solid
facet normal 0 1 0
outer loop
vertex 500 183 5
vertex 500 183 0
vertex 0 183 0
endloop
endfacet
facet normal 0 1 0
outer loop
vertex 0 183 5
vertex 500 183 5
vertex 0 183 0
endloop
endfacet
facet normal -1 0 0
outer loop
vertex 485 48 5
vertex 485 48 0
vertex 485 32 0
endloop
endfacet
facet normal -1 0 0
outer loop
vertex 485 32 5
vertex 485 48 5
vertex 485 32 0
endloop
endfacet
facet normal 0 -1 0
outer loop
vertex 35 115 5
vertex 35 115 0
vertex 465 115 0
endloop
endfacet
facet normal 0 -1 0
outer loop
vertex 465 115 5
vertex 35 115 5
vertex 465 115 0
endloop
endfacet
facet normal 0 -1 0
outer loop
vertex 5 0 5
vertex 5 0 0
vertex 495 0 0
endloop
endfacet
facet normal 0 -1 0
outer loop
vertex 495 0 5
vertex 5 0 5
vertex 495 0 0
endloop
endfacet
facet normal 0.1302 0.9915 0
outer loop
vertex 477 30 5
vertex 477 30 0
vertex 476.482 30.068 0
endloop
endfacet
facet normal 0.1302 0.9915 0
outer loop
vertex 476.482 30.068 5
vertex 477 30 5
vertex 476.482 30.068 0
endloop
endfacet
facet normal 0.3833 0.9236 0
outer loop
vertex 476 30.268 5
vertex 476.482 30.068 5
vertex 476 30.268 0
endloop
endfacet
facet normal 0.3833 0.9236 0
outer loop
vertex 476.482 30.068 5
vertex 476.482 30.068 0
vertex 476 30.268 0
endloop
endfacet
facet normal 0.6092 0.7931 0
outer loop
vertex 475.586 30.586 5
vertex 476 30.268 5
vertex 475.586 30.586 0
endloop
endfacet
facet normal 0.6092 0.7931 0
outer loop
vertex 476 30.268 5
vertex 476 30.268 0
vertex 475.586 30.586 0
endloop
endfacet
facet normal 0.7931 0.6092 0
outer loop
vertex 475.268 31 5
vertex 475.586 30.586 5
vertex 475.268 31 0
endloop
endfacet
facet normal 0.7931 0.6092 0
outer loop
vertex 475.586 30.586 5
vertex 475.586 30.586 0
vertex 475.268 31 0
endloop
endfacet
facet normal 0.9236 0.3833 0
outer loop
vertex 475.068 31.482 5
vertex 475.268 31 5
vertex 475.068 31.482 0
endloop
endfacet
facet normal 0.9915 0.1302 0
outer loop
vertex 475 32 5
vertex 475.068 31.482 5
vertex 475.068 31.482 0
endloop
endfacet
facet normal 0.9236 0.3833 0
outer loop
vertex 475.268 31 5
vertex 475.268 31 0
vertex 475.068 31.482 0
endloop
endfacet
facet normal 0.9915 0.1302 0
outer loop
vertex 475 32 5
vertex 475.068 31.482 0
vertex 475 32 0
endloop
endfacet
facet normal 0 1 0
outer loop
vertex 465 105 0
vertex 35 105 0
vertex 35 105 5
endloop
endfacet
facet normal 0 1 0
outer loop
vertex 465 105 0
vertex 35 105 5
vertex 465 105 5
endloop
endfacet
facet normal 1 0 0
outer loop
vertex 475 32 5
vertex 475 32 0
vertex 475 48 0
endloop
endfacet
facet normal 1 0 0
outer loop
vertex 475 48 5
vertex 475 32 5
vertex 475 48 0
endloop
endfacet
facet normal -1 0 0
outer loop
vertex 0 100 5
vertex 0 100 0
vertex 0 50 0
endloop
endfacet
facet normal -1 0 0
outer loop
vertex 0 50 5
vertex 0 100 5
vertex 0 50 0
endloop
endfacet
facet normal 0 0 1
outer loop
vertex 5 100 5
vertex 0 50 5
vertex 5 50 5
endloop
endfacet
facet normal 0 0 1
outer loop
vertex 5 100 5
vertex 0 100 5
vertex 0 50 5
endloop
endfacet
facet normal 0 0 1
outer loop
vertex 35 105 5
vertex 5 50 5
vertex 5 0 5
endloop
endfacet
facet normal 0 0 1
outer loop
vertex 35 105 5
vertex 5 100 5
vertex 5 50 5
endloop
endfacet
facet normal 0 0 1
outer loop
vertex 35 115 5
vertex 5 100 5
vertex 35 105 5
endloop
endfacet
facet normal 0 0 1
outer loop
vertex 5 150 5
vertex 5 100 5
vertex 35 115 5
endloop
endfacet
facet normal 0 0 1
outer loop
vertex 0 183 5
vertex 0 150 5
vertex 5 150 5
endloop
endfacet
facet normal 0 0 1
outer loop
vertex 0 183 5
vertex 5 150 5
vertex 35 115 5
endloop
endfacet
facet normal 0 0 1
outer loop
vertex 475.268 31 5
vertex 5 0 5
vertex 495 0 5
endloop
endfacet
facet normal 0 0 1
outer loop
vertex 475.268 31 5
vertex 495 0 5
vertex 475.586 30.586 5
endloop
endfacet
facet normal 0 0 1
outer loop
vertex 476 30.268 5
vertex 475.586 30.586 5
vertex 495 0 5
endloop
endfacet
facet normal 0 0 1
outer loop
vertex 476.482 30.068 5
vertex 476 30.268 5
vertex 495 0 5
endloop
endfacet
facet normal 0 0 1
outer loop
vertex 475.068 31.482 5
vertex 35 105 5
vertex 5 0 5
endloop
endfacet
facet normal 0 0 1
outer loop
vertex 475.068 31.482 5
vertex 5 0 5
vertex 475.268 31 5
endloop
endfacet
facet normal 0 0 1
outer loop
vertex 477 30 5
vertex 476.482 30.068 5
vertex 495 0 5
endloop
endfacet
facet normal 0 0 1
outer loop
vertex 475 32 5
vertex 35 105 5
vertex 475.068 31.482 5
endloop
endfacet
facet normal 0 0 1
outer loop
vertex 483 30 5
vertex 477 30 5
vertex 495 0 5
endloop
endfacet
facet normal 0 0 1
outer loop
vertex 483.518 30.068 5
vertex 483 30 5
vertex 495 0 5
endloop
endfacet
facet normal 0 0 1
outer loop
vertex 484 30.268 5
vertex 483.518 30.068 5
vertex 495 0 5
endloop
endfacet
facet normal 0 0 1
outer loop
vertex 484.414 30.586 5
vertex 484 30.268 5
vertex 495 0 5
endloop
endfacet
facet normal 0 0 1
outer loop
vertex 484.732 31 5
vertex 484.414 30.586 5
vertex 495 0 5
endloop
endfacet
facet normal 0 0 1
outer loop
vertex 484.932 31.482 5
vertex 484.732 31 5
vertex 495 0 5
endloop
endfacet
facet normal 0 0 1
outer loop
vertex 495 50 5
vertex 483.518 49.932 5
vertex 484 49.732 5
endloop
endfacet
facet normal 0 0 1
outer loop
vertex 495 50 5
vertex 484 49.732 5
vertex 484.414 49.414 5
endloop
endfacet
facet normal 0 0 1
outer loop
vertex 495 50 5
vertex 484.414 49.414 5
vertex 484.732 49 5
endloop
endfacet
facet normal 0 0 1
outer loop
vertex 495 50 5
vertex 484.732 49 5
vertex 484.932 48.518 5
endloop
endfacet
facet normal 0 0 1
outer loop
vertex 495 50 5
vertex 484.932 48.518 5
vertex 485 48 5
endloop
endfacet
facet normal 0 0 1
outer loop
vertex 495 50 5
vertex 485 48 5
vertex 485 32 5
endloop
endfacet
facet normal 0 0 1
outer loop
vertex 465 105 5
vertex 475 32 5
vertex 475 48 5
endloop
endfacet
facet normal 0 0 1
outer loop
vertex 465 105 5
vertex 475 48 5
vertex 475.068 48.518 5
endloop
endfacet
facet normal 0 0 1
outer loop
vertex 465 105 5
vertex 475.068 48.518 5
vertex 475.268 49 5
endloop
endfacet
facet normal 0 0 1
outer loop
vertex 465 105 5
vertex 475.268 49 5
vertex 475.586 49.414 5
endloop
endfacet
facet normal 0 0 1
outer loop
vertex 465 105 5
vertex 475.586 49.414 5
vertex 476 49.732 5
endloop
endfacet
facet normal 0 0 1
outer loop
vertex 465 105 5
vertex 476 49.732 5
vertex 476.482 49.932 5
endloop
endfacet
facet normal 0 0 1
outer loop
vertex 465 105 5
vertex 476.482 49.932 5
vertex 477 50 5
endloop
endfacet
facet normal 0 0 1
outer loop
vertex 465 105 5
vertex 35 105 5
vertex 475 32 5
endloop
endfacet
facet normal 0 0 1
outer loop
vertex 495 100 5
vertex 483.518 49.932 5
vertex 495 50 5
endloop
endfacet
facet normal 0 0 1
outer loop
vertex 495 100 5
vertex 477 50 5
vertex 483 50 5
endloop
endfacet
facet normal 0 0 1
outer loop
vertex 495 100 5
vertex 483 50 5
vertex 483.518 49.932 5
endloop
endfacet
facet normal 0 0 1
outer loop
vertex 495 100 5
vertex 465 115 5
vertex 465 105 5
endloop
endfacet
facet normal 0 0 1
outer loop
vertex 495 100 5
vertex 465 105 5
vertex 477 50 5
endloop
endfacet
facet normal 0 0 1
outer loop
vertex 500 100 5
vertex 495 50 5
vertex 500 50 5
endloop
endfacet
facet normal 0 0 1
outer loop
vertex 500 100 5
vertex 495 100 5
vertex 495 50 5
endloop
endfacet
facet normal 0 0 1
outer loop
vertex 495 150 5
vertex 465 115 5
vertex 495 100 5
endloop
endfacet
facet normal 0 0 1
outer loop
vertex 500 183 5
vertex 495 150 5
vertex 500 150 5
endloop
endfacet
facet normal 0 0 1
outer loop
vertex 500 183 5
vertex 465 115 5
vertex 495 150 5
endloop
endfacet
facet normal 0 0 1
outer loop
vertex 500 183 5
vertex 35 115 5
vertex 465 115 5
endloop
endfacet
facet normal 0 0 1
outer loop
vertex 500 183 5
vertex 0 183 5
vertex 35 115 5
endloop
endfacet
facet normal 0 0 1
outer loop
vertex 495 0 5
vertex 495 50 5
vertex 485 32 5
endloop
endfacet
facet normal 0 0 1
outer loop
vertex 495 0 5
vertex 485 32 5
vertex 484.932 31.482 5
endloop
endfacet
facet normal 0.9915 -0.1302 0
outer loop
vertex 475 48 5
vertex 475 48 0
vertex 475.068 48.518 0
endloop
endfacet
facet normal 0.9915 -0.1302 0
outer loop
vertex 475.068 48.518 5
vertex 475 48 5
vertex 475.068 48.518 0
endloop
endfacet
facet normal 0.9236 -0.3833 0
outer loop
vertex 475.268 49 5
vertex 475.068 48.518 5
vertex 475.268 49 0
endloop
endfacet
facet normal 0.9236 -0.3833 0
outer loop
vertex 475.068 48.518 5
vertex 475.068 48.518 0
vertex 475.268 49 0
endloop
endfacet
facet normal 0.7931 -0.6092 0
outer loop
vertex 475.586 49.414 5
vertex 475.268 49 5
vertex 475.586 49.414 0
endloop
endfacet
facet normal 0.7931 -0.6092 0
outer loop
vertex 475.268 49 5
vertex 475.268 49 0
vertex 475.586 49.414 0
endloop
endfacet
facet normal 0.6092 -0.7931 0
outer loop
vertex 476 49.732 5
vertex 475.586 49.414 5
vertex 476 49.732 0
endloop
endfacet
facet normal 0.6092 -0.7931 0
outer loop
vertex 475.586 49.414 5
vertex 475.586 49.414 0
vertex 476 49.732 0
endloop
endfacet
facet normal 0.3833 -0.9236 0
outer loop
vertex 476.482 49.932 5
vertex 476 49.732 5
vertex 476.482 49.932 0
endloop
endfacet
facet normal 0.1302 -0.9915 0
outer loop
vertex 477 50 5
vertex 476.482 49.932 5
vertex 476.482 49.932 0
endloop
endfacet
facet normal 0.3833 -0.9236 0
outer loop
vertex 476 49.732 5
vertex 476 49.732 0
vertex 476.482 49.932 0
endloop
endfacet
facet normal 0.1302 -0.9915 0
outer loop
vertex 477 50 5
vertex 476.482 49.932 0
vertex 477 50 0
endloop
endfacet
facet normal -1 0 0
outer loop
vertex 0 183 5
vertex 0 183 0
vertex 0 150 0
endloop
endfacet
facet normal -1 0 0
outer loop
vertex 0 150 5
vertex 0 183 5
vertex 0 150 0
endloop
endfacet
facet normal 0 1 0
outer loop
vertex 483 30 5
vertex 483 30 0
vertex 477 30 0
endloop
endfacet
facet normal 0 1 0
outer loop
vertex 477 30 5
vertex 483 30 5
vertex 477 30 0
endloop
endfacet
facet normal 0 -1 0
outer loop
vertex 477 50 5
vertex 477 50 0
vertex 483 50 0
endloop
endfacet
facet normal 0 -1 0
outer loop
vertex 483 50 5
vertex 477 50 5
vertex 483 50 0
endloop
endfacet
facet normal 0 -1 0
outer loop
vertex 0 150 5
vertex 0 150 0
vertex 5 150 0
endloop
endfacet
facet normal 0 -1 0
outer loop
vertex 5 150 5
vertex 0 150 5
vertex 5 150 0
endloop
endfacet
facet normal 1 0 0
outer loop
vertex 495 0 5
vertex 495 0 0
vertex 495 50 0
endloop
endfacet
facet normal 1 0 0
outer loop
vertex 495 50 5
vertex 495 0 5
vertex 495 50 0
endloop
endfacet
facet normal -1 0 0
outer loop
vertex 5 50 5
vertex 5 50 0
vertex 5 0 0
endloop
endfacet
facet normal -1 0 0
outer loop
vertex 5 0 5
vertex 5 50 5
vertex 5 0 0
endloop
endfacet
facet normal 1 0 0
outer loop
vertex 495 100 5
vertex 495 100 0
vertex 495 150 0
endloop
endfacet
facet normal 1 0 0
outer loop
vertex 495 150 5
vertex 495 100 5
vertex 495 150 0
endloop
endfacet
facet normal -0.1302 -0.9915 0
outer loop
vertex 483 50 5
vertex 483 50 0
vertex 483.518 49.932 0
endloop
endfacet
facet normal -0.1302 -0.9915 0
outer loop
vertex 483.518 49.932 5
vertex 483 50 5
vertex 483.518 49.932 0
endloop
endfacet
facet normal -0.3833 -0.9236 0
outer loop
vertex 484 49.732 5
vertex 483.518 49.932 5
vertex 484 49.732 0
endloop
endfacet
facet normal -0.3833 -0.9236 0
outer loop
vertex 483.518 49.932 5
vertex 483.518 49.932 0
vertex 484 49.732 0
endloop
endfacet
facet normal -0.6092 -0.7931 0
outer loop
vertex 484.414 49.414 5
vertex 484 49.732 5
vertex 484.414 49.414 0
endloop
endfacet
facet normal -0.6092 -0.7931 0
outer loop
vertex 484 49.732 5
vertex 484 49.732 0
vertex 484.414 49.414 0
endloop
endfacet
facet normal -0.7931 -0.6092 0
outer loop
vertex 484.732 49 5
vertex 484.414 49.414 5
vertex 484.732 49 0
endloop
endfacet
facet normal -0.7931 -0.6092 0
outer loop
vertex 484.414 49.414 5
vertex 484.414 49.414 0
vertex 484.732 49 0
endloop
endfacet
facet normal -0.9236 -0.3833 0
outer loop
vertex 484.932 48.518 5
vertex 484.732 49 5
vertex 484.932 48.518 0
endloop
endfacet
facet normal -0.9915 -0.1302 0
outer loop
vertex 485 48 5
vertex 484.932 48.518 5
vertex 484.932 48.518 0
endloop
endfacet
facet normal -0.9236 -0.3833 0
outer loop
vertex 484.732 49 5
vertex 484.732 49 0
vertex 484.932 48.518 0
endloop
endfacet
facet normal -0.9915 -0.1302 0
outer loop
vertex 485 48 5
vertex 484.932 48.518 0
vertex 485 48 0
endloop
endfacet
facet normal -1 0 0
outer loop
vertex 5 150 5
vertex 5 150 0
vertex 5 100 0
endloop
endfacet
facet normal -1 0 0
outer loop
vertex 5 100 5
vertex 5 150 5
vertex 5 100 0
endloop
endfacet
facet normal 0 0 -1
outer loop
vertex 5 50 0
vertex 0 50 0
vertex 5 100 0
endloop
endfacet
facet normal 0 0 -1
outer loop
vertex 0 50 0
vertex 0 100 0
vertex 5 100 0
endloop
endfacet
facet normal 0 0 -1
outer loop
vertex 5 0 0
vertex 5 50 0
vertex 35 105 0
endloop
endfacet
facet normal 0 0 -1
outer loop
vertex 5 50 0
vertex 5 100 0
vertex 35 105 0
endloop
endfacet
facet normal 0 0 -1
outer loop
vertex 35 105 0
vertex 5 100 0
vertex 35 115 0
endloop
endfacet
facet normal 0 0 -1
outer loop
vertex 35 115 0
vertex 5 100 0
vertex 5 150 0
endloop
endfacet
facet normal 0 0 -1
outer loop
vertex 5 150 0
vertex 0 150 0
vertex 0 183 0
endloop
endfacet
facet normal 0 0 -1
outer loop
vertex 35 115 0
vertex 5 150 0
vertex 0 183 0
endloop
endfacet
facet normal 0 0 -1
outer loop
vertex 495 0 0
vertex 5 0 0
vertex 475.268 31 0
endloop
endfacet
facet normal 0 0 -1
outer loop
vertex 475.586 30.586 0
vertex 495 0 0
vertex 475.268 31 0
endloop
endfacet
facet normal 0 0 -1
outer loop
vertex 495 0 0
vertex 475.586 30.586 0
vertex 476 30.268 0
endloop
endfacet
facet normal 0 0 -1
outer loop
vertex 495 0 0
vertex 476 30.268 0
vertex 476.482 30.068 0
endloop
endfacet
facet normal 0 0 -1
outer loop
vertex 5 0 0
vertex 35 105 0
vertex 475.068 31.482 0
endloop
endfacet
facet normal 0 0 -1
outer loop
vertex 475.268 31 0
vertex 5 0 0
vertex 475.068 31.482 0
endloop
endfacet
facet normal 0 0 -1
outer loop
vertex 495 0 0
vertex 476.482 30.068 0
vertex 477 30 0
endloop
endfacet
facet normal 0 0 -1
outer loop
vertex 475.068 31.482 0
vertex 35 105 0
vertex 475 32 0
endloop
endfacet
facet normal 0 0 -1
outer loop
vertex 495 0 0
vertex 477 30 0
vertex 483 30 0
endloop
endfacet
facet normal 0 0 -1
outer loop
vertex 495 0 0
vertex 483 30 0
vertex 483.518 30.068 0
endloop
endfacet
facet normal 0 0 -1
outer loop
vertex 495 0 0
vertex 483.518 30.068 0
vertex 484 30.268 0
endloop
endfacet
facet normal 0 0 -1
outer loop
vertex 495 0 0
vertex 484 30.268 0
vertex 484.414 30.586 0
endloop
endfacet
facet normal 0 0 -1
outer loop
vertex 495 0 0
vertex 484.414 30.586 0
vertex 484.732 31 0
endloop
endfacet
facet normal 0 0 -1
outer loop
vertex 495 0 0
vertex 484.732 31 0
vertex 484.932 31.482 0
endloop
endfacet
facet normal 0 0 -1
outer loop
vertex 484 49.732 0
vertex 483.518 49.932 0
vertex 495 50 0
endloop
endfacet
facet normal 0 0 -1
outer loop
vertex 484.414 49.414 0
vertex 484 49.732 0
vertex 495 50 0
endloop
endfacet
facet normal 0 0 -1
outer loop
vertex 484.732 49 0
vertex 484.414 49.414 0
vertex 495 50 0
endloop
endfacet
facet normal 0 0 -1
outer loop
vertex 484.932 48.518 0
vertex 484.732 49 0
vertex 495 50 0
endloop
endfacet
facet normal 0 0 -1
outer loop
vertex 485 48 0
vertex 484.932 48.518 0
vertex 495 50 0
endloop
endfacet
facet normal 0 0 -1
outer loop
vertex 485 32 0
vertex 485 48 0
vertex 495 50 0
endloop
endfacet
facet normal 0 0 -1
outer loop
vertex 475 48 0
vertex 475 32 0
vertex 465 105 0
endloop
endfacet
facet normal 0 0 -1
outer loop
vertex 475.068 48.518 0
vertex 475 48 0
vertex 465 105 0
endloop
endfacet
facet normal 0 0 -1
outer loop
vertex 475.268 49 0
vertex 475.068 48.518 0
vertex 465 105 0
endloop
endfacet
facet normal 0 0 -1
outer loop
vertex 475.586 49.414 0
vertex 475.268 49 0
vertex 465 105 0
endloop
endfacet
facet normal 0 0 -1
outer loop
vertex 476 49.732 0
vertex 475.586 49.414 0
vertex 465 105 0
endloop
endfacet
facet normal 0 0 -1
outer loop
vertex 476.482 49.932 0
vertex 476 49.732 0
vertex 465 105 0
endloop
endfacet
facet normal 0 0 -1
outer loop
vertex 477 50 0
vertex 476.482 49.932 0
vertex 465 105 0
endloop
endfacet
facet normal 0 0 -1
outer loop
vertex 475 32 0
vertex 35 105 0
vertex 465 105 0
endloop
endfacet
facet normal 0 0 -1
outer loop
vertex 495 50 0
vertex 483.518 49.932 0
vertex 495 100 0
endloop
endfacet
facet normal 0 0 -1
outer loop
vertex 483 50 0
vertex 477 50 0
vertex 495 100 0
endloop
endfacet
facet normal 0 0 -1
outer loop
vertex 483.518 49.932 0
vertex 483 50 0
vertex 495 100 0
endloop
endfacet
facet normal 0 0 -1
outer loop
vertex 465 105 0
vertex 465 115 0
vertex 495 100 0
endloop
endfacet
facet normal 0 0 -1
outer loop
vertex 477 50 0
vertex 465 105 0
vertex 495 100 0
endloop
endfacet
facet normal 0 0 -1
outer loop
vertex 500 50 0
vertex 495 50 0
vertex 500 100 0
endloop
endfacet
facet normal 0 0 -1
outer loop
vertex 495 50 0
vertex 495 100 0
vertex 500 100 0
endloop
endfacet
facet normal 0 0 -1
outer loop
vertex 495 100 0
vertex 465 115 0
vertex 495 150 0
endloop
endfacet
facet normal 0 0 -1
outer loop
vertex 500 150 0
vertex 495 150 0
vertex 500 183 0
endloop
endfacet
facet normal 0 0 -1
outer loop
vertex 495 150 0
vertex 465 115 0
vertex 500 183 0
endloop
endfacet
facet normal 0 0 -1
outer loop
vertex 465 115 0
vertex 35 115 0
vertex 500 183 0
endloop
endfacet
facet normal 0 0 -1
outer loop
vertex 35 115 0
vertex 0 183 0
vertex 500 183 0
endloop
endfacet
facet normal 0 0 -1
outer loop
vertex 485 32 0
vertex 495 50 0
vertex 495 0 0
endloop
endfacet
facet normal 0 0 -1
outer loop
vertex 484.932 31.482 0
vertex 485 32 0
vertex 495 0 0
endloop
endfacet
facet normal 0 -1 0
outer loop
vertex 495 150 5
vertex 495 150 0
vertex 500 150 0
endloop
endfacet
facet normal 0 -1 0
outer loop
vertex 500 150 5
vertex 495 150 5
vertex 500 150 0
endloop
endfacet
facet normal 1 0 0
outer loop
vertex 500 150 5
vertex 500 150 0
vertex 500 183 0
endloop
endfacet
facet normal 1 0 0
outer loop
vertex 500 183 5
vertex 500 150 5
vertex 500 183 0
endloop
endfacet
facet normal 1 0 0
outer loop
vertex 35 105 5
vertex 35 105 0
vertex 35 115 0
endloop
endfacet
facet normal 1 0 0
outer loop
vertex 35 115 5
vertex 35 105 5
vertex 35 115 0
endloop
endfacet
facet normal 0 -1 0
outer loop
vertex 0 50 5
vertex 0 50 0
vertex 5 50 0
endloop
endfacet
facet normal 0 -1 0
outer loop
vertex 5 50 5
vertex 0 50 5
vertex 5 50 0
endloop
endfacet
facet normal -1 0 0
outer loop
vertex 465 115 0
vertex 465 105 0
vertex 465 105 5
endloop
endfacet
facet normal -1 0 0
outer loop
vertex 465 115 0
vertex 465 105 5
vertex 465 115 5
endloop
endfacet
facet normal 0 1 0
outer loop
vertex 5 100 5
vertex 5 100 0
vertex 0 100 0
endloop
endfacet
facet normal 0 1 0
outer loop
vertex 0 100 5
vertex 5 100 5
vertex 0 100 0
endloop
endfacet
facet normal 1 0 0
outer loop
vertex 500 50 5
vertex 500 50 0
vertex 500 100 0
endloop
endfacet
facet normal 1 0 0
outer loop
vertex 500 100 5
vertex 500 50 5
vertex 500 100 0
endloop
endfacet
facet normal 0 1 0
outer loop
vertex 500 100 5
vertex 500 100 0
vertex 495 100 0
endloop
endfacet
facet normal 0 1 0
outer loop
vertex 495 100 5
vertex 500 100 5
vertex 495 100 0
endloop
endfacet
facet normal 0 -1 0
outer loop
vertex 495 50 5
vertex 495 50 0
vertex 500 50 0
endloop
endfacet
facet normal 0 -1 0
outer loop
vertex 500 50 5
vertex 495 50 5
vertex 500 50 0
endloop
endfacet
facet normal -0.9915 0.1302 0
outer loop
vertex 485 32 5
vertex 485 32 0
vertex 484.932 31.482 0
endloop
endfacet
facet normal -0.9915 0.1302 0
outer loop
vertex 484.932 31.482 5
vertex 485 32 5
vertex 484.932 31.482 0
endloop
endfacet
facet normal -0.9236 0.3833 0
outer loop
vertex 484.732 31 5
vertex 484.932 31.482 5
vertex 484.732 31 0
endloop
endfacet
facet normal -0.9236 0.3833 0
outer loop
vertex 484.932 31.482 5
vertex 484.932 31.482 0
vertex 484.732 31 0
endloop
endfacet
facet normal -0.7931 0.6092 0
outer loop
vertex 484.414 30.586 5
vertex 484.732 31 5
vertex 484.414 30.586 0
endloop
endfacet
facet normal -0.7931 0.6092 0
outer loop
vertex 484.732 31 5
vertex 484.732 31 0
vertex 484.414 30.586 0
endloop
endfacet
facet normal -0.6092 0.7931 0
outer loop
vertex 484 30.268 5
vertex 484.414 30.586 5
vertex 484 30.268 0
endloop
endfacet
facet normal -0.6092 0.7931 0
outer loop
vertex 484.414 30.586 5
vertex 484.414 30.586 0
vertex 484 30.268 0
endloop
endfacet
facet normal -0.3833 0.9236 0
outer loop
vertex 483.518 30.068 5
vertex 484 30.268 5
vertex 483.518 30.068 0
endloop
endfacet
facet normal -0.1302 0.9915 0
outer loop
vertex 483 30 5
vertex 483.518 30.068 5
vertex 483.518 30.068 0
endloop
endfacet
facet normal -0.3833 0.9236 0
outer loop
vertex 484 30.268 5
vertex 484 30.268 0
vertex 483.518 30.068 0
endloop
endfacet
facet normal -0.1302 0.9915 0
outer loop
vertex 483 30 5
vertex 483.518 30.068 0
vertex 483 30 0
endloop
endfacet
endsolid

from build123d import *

# Parameters (mm, degrees)
ESQUISSE1_W             = 430
ESQUISSE1_H             = 10
BOSS_EXTRU_1_DEPTH      = 5
ENL_V_MAT_EXTRU_1_REACH = 7


with BuildPart() as part:
    # Esquisse1 → Boss.-Extru.1 (new body)
    with BuildSketch(Plane.XY):
        Polygon((0, 50), (5, 50), (5, 0), (495, 0), (495, 50), (500, 50), (500, 100), (495, 100), (495, 150), (500, 150), (500, 183), (0, 183), (0, 150), (5, 150), (5, 100), (0, 100), align=None)
        with Locations((250, 110)):
            Rectangle(ESQUISSE1_W, ESQUISSE1_H, mode=Mode.SUBTRACT)
    extrude(amount=BOSS_EXTRU_1_DEPTH)

    # Esquisse2 → Enlèv. mat.-Extru.1 (cut, up to next)
    with BuildSketch(Plane(origin=(0, 0, 0), x_dir=(-1, 0, 0), z_dir=(0, 0, -1)), mode=Mode.PRIVATE) as enl_v_mat_extru_1_sk1:
        with BuildLine():
            Line((-483, 30), (-477, 30))
            ThreePointArc((-477, 30), (-475.585786438, 30.585786438), (-475, 32))
            Line((-475, 32), (-475, 48))
            ThreePointArc((-475, 48), (-475.585786438, 49.414213562), (-477, 50))
            Line((-477, 50), (-483, 50))
            ThreePointArc((-483, 50), (-484.414213562, 49.414213562), (-485, 48))
            Line((-485, 48), (-485, 32))
            ThreePointArc((-485, 32), (-484.414213562, 30.585786438), (-483, 30))
        make_face()
    enl_v_mat_extru_1_tool1 = extrude(enl_v_mat_extru_1_sk1.sketch, amount=-ENL_V_MAT_EXTRU_1_REACH, mode=Mode.PRIVATE) & part.part
    add(enl_v_mat_extru_1_tool1.solids().sort_by_distance((480, 40, 0))[0], mode=Mode.SUBTRACT)


solid = part.part
